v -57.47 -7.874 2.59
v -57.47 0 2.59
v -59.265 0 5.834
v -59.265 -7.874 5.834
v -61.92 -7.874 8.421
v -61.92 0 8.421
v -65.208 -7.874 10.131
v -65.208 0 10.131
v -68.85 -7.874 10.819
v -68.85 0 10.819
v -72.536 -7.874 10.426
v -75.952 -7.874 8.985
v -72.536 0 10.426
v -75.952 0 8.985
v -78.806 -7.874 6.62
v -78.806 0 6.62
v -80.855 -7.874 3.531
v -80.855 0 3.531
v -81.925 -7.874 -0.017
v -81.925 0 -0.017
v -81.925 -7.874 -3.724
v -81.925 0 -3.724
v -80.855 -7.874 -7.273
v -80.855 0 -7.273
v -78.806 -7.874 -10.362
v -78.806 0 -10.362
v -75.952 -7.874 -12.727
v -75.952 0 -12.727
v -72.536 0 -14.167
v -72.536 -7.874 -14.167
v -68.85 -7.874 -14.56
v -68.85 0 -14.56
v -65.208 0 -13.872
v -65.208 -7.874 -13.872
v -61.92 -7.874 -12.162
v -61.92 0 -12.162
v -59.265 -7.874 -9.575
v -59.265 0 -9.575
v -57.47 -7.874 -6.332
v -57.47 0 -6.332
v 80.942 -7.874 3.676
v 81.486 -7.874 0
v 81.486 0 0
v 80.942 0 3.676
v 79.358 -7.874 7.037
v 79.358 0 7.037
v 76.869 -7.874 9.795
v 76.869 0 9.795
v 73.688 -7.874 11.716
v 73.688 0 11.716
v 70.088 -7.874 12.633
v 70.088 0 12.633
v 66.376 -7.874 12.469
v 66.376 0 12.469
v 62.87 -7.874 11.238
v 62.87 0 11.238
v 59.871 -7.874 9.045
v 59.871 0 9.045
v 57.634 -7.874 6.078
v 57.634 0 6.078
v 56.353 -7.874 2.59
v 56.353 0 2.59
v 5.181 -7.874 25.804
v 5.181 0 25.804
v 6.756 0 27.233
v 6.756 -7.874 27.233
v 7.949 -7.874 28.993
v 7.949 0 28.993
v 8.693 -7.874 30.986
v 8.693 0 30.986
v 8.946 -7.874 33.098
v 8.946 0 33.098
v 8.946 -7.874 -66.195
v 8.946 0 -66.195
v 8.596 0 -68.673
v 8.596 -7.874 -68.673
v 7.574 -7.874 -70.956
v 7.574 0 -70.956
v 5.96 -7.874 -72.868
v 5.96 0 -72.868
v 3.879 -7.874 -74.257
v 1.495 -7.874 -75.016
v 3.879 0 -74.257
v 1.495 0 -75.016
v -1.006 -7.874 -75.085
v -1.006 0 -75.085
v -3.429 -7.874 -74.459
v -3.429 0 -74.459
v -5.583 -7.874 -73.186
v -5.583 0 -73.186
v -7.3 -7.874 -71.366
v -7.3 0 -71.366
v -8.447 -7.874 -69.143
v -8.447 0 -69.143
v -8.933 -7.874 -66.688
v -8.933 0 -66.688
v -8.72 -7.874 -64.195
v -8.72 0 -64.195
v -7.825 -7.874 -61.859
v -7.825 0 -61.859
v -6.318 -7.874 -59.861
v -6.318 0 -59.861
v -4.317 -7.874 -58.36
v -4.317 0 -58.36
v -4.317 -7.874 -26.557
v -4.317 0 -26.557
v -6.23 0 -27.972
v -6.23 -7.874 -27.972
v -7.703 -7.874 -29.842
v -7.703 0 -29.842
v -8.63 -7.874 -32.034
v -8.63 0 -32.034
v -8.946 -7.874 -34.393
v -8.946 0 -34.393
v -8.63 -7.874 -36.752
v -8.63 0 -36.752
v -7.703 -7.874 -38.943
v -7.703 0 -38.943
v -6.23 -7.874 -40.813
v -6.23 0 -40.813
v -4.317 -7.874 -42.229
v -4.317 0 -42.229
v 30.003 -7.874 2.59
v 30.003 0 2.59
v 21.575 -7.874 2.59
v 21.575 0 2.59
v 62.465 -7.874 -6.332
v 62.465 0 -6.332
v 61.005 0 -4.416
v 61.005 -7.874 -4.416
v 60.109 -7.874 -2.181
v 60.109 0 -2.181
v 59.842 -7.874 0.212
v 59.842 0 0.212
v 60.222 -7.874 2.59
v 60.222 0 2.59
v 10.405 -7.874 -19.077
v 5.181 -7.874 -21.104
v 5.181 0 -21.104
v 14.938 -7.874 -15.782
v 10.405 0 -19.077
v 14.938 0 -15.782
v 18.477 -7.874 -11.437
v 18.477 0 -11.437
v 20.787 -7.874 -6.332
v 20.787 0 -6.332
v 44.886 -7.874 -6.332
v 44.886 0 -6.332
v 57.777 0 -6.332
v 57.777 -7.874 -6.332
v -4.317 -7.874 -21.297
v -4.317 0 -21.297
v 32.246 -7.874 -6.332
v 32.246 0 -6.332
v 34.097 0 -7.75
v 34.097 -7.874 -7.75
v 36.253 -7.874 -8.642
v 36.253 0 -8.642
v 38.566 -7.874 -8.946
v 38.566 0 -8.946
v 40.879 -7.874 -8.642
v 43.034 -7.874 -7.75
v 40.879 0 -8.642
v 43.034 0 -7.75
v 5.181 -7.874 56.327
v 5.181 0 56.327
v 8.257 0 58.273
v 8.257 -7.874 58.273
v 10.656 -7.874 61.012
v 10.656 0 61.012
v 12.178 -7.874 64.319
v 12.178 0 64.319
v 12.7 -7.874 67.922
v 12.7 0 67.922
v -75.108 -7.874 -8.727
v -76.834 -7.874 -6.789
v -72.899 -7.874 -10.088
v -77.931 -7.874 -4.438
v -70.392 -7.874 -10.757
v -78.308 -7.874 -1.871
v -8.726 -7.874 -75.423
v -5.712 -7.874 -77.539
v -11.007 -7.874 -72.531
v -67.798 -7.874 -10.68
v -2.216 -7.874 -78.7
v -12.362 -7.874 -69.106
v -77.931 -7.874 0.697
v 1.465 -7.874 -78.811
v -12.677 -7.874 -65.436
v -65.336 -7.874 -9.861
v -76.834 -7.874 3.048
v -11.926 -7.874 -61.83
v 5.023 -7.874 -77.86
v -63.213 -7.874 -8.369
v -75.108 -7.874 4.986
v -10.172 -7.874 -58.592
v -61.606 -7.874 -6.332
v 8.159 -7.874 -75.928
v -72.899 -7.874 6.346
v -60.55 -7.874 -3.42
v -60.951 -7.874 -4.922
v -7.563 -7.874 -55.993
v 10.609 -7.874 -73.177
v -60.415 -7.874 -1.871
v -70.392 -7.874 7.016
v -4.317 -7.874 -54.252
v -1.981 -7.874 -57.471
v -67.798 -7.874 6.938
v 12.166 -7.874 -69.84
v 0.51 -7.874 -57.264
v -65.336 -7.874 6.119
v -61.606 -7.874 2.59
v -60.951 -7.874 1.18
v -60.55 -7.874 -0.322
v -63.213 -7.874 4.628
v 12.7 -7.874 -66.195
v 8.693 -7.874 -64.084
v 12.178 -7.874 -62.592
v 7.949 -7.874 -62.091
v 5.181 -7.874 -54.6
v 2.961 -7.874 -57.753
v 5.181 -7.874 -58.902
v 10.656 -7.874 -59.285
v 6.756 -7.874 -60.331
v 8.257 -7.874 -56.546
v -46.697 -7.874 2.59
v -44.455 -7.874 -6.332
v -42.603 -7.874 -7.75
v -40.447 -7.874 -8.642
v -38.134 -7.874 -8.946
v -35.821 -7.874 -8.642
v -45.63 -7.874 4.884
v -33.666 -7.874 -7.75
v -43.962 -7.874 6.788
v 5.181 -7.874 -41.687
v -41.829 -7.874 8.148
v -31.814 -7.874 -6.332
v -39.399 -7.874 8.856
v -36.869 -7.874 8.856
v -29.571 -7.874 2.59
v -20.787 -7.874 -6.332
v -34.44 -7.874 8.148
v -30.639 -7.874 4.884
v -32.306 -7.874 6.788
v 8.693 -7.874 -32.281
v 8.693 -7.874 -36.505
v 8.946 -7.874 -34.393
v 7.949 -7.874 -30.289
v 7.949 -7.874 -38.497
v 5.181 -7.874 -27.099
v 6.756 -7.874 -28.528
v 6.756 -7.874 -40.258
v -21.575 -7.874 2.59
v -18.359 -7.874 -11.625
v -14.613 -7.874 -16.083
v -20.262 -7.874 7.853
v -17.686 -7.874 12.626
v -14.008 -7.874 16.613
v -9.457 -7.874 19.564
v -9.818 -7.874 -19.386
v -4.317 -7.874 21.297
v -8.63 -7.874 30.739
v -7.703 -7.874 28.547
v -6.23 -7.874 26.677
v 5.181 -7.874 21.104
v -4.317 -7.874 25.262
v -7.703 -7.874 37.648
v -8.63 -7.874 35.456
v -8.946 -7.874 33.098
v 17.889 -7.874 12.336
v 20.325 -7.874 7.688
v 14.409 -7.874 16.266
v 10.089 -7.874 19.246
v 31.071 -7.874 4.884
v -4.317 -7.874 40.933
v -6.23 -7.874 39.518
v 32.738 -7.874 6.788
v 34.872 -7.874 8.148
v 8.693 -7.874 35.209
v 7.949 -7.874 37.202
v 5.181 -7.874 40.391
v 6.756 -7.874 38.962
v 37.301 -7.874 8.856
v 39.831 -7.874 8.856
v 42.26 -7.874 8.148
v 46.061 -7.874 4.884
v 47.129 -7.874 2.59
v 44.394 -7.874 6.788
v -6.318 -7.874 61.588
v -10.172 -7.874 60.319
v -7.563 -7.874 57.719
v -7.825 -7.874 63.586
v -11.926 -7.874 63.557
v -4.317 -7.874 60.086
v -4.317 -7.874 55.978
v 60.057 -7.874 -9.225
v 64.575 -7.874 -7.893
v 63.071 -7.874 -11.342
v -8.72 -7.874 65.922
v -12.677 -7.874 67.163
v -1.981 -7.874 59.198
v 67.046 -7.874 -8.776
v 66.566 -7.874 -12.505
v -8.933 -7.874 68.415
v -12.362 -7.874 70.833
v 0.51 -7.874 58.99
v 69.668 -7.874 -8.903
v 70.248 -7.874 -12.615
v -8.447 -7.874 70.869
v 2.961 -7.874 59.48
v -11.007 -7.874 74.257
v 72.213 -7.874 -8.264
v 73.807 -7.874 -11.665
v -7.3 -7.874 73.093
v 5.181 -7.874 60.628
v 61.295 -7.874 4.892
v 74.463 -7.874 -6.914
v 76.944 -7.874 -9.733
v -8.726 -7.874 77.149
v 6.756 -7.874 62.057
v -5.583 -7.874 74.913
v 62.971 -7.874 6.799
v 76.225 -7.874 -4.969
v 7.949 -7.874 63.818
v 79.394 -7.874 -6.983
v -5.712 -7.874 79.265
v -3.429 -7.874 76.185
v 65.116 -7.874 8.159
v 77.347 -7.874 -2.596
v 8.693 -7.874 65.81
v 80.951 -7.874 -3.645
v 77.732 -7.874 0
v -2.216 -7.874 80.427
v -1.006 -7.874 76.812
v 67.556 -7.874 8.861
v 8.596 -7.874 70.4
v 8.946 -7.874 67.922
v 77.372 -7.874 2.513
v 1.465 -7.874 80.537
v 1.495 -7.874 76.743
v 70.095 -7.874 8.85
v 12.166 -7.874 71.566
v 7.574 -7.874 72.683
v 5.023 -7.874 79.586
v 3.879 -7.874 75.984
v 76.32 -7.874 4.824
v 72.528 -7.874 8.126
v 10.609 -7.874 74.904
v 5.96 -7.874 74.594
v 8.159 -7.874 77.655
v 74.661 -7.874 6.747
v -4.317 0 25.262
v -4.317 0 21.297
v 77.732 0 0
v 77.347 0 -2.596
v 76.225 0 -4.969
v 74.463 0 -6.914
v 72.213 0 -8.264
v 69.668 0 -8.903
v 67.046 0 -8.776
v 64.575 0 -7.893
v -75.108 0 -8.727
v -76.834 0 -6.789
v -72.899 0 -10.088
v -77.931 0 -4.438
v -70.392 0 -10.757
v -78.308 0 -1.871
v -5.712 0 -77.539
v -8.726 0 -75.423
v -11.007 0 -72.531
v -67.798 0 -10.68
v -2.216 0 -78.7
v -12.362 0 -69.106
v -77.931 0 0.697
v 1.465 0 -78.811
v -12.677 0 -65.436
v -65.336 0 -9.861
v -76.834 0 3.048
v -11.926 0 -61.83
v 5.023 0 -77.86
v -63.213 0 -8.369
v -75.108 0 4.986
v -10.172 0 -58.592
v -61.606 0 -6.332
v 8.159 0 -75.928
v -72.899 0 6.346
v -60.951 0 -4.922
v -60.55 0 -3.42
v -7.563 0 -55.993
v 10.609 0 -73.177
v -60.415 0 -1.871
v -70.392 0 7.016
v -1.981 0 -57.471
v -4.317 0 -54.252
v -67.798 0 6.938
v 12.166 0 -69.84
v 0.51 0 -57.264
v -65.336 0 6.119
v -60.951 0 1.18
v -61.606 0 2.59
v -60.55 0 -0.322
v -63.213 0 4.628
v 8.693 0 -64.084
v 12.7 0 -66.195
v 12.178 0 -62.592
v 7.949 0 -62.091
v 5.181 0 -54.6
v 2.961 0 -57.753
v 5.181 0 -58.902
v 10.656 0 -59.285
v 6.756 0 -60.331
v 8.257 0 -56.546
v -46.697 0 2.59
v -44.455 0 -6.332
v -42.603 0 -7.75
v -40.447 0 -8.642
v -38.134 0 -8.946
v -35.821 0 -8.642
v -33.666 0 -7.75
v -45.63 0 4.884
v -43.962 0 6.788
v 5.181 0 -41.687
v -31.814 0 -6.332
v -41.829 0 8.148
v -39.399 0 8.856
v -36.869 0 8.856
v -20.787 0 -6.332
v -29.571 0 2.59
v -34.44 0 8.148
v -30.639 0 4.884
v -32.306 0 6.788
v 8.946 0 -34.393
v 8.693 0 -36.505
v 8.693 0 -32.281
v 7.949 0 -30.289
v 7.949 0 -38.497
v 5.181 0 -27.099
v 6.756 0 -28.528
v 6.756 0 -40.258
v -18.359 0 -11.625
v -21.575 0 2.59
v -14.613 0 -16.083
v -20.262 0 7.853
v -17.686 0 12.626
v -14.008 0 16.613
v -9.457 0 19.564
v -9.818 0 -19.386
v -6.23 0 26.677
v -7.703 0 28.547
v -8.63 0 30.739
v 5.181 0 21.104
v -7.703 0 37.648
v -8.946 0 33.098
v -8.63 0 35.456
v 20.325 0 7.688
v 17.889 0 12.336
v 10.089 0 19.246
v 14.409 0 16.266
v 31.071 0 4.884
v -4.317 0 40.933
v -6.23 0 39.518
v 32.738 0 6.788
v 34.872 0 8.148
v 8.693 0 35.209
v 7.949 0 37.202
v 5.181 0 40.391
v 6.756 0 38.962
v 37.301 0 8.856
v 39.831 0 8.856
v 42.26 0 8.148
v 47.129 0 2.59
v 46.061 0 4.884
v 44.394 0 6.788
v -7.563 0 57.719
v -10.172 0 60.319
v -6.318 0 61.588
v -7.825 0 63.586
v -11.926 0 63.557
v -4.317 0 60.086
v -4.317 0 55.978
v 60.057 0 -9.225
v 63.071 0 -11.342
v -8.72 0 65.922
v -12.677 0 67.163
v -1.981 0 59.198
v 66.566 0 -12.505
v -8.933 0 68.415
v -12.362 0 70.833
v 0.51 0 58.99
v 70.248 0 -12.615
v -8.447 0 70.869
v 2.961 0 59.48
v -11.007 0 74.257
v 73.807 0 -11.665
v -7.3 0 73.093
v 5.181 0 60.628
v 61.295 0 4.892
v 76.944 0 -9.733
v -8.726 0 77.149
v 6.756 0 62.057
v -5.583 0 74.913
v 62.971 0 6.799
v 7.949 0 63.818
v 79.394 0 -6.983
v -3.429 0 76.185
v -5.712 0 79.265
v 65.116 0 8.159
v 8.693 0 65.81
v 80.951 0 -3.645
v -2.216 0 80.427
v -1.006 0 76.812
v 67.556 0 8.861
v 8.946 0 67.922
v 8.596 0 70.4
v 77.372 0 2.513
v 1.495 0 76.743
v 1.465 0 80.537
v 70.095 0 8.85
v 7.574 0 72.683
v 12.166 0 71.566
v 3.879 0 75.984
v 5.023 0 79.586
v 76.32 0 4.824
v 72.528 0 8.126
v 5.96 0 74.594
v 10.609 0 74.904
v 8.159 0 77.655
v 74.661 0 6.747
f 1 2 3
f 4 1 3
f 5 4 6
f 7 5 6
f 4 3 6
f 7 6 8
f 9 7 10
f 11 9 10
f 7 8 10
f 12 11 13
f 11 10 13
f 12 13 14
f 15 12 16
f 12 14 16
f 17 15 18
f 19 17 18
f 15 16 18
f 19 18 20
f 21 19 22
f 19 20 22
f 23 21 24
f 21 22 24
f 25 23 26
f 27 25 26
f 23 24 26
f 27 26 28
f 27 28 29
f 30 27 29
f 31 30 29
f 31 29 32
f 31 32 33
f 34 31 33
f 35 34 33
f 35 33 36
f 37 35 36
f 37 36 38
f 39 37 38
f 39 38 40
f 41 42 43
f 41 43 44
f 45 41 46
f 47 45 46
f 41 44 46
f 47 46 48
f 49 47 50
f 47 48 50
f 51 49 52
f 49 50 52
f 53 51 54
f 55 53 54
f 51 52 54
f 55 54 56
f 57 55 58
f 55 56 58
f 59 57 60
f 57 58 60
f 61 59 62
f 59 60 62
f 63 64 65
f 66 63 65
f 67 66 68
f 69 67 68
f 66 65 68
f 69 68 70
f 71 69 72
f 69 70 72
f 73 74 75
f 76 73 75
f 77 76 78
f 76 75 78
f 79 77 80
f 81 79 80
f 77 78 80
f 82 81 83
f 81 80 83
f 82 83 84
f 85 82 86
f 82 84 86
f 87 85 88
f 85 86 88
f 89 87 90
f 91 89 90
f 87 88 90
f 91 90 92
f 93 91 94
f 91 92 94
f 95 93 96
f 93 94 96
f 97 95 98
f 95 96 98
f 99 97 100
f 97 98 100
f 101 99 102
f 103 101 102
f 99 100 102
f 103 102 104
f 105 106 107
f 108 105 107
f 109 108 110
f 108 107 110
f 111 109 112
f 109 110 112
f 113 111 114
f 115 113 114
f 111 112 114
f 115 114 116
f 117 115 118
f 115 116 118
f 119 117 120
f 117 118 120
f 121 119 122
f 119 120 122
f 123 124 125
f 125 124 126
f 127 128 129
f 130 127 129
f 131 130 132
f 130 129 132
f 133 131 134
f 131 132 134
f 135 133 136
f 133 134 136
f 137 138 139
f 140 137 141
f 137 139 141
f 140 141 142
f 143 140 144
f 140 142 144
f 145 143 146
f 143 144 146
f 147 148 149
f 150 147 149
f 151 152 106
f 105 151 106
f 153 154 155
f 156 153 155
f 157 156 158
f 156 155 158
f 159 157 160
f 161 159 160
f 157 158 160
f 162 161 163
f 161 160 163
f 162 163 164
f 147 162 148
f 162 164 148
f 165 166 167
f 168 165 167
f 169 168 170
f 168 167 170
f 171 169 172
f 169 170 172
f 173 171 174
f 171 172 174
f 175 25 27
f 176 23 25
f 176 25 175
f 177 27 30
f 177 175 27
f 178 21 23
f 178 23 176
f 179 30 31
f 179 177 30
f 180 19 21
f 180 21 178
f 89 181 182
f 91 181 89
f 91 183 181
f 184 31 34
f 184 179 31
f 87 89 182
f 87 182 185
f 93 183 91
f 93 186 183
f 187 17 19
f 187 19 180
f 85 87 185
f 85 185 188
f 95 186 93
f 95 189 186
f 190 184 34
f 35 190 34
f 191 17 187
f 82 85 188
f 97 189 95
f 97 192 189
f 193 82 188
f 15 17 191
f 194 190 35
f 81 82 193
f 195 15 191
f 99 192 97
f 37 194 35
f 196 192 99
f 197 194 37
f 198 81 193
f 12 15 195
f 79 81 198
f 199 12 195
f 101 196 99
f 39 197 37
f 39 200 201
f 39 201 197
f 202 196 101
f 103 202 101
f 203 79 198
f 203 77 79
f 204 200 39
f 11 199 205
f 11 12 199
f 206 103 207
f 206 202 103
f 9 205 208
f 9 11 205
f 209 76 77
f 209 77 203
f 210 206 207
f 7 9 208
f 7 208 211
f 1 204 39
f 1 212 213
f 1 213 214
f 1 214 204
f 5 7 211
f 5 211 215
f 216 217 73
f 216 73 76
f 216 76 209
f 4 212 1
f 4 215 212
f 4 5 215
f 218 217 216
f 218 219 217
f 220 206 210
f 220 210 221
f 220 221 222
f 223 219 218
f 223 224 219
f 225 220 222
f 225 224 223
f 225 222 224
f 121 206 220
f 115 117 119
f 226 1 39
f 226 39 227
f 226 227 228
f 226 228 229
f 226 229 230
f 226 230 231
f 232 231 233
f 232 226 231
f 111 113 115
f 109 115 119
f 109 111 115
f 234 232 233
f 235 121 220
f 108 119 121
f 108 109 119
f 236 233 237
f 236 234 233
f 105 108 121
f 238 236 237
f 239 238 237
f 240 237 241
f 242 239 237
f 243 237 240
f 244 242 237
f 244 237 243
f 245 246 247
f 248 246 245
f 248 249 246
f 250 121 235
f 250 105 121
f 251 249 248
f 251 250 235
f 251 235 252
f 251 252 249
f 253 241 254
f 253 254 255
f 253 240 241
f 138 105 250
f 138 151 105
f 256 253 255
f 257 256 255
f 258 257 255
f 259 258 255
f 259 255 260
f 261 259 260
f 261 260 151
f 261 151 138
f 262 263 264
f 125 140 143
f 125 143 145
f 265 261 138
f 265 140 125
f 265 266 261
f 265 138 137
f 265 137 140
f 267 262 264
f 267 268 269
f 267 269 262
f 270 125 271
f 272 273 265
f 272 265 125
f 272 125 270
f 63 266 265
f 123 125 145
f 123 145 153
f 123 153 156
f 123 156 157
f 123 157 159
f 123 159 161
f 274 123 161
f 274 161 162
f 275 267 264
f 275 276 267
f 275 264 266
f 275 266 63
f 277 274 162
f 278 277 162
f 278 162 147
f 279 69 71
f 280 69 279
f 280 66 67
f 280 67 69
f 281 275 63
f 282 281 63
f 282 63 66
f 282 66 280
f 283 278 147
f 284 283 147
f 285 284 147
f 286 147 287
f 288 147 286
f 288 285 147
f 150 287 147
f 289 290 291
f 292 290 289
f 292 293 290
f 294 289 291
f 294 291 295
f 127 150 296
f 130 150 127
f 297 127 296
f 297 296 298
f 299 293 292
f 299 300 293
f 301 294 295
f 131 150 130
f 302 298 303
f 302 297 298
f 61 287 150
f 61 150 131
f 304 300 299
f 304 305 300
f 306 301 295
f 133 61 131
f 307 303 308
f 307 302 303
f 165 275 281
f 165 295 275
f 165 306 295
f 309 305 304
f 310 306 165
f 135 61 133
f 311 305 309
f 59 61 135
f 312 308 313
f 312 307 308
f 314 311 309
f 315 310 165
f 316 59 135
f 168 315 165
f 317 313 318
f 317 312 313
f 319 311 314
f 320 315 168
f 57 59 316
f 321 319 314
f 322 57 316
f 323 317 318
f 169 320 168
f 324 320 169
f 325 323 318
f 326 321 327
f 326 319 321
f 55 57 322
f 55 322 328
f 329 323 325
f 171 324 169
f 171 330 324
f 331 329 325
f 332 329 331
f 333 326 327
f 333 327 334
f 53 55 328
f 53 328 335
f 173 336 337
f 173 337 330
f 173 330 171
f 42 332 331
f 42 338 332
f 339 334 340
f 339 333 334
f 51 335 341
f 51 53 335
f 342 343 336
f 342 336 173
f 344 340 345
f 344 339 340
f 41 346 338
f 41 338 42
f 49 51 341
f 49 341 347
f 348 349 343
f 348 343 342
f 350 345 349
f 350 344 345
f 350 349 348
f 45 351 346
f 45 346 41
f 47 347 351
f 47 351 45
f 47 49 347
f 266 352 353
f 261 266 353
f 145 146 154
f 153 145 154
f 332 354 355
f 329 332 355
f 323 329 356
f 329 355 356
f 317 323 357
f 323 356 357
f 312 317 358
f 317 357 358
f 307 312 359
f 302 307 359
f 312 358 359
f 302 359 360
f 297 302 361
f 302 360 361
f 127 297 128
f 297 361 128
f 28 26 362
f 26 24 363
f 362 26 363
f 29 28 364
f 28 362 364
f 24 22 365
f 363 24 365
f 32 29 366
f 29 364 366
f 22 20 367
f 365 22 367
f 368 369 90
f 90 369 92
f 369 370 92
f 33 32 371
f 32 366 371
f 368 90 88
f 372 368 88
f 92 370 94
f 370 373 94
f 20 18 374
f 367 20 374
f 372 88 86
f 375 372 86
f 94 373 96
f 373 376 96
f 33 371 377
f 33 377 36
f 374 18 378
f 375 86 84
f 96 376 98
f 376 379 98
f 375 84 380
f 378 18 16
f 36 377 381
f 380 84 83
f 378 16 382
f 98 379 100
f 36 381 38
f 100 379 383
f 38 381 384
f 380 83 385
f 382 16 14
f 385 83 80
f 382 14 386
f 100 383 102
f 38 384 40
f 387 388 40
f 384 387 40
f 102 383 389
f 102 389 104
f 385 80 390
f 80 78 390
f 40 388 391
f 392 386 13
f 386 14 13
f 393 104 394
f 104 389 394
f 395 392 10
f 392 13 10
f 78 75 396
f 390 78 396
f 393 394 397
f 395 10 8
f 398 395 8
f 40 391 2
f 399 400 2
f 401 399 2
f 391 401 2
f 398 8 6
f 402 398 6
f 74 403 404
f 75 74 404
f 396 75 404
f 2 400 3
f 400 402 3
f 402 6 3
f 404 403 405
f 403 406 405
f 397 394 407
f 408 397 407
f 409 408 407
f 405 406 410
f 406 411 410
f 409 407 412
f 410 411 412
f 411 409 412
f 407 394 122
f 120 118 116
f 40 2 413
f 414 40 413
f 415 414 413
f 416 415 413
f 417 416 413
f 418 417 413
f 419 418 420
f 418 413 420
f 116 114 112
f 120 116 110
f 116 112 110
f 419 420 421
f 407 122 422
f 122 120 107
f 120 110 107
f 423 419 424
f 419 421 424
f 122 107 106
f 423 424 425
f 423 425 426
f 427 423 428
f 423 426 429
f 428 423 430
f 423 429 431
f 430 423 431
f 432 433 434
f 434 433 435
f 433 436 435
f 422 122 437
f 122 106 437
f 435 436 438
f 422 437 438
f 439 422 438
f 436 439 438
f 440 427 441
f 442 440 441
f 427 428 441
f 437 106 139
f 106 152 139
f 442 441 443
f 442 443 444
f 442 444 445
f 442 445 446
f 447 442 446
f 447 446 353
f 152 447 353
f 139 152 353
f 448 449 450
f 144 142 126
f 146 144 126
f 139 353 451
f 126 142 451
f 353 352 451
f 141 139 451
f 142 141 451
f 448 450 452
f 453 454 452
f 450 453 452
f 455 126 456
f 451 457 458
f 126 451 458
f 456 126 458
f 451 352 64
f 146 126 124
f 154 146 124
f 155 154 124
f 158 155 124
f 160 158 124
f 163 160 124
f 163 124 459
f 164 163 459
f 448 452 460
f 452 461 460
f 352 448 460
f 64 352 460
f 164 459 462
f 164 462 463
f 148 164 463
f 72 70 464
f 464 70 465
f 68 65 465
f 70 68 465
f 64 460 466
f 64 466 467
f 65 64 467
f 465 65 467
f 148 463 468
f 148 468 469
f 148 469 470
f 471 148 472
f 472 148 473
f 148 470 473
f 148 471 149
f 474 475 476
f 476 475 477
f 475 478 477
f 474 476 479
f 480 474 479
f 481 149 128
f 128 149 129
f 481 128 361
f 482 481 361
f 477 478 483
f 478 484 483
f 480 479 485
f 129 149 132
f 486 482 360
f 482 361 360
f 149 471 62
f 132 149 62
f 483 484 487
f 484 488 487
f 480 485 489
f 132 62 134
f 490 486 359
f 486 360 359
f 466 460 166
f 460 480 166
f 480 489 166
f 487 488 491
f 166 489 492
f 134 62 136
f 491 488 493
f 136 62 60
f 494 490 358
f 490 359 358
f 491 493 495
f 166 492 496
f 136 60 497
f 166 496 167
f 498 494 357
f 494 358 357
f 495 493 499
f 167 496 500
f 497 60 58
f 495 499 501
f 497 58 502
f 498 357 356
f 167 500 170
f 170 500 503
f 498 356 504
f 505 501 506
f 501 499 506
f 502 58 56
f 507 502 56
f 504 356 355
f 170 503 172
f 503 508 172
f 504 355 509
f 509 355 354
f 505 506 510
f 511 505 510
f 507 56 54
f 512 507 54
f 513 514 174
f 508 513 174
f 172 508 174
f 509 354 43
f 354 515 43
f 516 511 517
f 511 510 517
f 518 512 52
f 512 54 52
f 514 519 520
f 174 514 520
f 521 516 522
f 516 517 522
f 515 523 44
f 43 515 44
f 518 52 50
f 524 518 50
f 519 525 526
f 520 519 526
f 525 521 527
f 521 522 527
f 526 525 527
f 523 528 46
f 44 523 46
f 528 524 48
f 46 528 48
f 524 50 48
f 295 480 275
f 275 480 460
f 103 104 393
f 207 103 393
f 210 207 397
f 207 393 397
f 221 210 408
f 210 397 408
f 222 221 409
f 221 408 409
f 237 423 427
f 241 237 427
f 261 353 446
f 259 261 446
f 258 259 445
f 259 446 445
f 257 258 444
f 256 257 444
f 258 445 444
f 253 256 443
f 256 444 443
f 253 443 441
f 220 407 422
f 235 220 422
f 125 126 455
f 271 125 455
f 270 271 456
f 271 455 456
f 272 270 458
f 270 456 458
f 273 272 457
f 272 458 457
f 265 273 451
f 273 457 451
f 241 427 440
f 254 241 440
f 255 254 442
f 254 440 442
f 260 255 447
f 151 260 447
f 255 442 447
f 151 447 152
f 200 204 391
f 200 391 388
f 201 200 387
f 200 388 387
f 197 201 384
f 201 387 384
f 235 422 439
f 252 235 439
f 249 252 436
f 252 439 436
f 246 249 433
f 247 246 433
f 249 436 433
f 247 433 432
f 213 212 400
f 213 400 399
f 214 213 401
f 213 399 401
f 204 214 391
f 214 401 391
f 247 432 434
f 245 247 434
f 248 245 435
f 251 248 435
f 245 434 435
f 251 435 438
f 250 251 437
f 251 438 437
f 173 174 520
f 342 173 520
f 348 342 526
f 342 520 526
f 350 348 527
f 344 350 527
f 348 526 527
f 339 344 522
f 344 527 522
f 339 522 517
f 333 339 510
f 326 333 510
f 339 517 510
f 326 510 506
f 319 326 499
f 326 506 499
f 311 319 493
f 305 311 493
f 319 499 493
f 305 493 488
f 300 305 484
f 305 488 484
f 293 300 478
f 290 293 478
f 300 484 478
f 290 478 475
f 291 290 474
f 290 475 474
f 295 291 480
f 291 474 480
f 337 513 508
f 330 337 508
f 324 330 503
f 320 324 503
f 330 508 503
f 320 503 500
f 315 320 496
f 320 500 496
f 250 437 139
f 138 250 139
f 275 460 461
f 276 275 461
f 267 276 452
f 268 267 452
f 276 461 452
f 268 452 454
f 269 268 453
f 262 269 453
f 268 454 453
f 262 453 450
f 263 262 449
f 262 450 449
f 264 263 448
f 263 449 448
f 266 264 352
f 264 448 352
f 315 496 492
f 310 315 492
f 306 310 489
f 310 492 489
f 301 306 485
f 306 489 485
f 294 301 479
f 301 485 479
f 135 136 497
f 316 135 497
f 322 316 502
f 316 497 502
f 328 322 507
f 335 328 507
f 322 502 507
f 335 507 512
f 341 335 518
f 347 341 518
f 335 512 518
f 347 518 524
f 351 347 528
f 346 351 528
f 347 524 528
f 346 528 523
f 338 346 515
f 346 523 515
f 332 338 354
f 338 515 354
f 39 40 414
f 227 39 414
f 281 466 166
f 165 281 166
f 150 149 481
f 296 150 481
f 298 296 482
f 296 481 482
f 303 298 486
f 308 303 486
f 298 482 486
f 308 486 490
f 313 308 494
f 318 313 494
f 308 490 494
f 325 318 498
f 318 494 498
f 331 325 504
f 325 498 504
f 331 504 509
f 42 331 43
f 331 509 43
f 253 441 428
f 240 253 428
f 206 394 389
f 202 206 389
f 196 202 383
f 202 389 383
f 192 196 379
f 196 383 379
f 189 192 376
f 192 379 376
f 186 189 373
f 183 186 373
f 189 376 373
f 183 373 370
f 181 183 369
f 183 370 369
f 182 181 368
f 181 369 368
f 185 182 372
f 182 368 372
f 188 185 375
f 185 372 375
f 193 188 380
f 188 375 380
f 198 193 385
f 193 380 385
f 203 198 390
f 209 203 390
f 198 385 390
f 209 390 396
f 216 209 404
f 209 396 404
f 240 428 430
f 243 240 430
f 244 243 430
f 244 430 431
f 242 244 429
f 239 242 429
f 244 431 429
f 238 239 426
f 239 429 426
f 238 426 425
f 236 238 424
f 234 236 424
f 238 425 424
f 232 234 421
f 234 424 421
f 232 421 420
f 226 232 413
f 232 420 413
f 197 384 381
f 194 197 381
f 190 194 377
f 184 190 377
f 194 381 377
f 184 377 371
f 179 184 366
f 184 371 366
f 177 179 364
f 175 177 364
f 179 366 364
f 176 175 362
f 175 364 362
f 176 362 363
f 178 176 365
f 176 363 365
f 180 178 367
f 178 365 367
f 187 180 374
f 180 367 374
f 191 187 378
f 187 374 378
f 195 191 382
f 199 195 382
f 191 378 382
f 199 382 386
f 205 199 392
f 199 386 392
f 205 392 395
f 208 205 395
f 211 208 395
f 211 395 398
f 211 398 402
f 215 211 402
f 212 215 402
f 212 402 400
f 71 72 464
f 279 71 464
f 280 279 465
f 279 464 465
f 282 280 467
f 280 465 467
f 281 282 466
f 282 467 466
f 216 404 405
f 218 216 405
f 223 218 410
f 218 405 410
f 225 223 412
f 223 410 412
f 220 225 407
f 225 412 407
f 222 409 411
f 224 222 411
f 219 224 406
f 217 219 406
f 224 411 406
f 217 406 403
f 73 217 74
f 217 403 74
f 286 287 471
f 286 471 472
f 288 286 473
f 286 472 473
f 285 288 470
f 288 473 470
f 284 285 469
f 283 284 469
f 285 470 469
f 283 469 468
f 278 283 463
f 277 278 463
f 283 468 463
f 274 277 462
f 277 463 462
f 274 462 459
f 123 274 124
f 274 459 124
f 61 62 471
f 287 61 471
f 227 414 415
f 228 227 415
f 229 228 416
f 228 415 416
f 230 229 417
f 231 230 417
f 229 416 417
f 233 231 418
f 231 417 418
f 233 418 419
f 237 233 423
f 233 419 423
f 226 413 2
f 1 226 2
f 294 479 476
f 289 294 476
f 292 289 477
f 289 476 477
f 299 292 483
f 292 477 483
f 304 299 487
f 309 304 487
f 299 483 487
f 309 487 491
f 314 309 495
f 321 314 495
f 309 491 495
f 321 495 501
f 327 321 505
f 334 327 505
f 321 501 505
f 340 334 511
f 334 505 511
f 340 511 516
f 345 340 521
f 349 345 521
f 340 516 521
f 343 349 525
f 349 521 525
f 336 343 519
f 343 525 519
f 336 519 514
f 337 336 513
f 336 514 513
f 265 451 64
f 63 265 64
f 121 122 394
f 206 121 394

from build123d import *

# Parameters (mm, degrees)
F1_DEPTH = 7.874


with BuildPart() as f1:
    # F0 (on Front) → F1 (new body)
    with BuildSketch(Plane.XZ):
        with BuildLine():
            Line((-4.3170880526, 2.5902516209), (-4.3170880526, 0))
            Line((-4.3170880526, 0), (5.18050557, 0))
            Line((5.18050557, 0), (5.18050557, 2.5902516209))
            Line((5.18050557, 2.5902516209), (5.18050557, 21.1036454269))
            ThreePointArc((5.18050557, 21.1036454269), (0.4424065531, 21.7256936531), (-4.3170880526, 21.2970476595))
            Line((-4.3170880526, 21.2970476595), (-4.3170880526, 2.5902516209))
        make_face()
        with BuildLine():
            Line((-4.3170880526, -6.3317269087), (-4.3170880526, 0))
            Line((-4.3170880526, 0), (-4.3170880526, 2.5902516209))
            Line((-4.3170880526, 2.5902516209), (-21.5752655791, 2.5902516209))
            ThreePointArc((-21.5752655791, 2.5902516209), (-21.6459371683, -1.911777281), (-20.7872730925, -6.3317269087))
            Line((-20.7872730925, -6.3317269087), (-4.3170880526, -6.3317269087))
        make_face()
        with BuildLine():
            Line((5.18050557, 0), (-4.3170880526, 0))
            Line((-4.3170880526, 0), (-4.3170880526, -6.3317269087))
            Line((-4.3170880526, -6.3317269087), (-4.3170880526, -21.2970476595))
            ThreePointArc((-4.3170880526, -21.2970476595), (0.4424065531, -21.7256936531), (5.18050557, -21.1036454269))
            Line((5.18050557, -21.1036454269), (5.18050557, -6.3317269087))
            Line((5.18050557, -6.3317269087), (5.18050557, 0))
        make_face()
        with BuildLine():
            Line((5.18050557, 2.5902516209), (5.18050557, 0))
            Line((5.18050557, 0), (5.18050557, -6.3317269087))
            Line((5.18050557, -6.3317269087), (20.7872730925, -6.3317269087))
            ThreePointArc((20.7872730925, -6.3317269087), (21.4931738046, -3.2007761674), (21.7301976122, 0))
            ThreePointArc((21.7301976122, 0), (21.6914300224, 1.297440499), (21.5752655791, 2.5902516209))
            Line((21.5752655791, 2.5902516209), (5.18050557, 2.5902516209))
        make_face()
        with BuildLine():
            Line((-21.5752655791, 2.5902516209), (-4.3170880526, 2.5902516209))
            Line((-4.3170880526, 2.5902516209), (-4.3170880526, 21.2970476595))
            ThreePointArc((-4.3170880526, 21.2970476595), (-15.9715230537, 14.7347188508), (-21.5752655791, 2.5902516209))
        make_face()
        with BuildLine():
            Line((-4.3170880526, -21.2970476595), (-4.3170880526, -6.3317269087))
            Line((-4.3170880526, -6.3317269087), (-20.7872730925, -6.3317269087))
            ThreePointArc((-20.7872730925, -6.3317269087), (-14.6132625864, -16.0827250442), (-4.3170880526, -21.2970476595))
        make_face()
        with BuildLine():
            Line((5.18050557, 21.1036454269), (5.18050557, 2.5902516209))
            Line((5.18050557, 2.5902516209), (21.5752655791, 2.5902516209))
            ThreePointArc((21.5752655791, 2.5902516209), (16.2681978105, 14.4064995147), (5.18050557, 21.1036454269))
        make_face()
        with BuildLine():
            Line((20.7872730925, -6.3317269087), (5.18050557, -6.3317269087))
            Line((5.18050557, -6.3317269087), (5.18050557, -21.1036454269))
            ThreePointArc((5.18050557, -21.1036454269), (14.9376630148, -15.7818792266), (20.7872730925, -6.3317269087))
        make_face()
        with BuildLine():
            Line((-4.3170880526, 25.2618949621), (-4.3170880526, 21.2970476595))
            ThreePointArc((-4.3170880526, 21.2970476595), (0.4424065531, 21.7256936531), (5.18050557, 21.1036454269))
            Line((5.18050557, 21.1036454269), (5.18050557, 25.8039073839))
            ThreePointArc((5.18050557, 25.8039073839), (0.5097222957, 24.1658829253), (-4.3170880526, 25.2618949621))
        make_face()
        with BuildLine():
            ThreePointArc((-20.7872730925, -6.3317269087), (-21.6459371683, -1.911777281), (-21.5752655791, 2.5902516209))
            Line((-21.5752655791, 2.5902516209), (-29.5711408342, 2.5902516209))
            ThreePointArc((-29.5711408342, 2.5902516209), (-29.2842683913, 1.3092207994), (-29.1879529597, 0))
            ThreePointArc((-29.1879529597, 0), (-29.870502249, -3.4273494116), (-31.814001381, -6.3317269087))
            Line((-31.814001381, -6.3317269087), (-20.7872730925, -6.3317269087))
        make_face()
        with BuildLine():
            ThreePointArc((5.18050557, -21.1036454269), (0.4424065531, -21.7256936531), (-4.3170880526, -21.2970476595))
            Line((-4.3170880526, -21.2970476595), (-4.3170880526, -26.5570219367))
            ThreePointArc((-4.3170880526, -26.5570219367), (0.5097222957, -25.4610098999), (5.18050557, -27.0990343585))
            Line((5.18050557, -27.0990343585), (5.18050557, -21.1036454269))
        make_face()
        with BuildLine():
            Line((30.0028470318, 2.5902516209), (21.5752655791, 2.5902516209))
            ThreePointArc((21.5752655791, 2.5902516209), (21.6914300224, 1.297440499), (21.7301976122, 0))
            ThreePointArc((21.7301976122, 0), (21.4931738046, -3.2007761674), (20.7872730925, -6.3317269087))
            Line((20.7872730925, -6.3317269087), (32.2457075785, -6.3317269087))
            ThreePointArc((32.2457075785, -6.3317269087), (29.8896105664, -2.1811155839), (30.0028470318, 2.5902516209))
        make_face()
        with BuildLine():
            ThreePointArc((-4.3170880526, 40.9334291012), (-8.9463118, 33.0976620317), (-4.3170880526, 25.2618949621))
            Line((-4.3170880526, 25.2618949621), (-4.3170880526, 40.9334291012))
        make_face()
        with BuildLine():
            Line((-4.3170880526, 40.9334291012), (-4.3170880526, 25.2618949621))
            ThreePointArc((-4.3170880526, 25.2618949621), (0.5097222957, 24.1658829253), (5.18050557, 25.8039073839))
            Line((5.18050557, 25.8039073839), (5.18050557, 40.3914166794))
            ThreePointArc((5.18050557, 40.3914166794), (0.5097222957, 42.029441138), (-4.3170880526, 40.9334291012))
        make_face()
        with BuildLine():
            ThreePointArc((-29.1879529597, 0), (-29.2842683913, 1.3092207994), (-29.5711408342, 2.5902516209))
            Line((-29.5711408342, 2.5902516209), (-46.6973886852, 2.5902516209))
            ThreePointArc((-46.6973886852, 2.5902516209), (-46.8106251506, -2.1811155839), (-44.4545281385, -6.3317269087))
            Line((-44.4545281385, -6.3317269087), (-31.814001381, -6.3317269087))
            ThreePointArc((-31.814001381, -6.3317269087), (-29.870502249, -3.4273494116), (-29.1879529597, 0))
        make_face()
        with BuildLine():
            Line((-46.6973886852, 2.5902516209), (-29.5711408342, 2.5902516209))
            ThreePointArc((-29.5711408342, 2.5902516209), (-38.1342647597, 8.9463118), (-46.6973886852, 2.5902516209))
        make_face()
        with BuildLine():
            ThreePointArc((5.18050557, -27.0990343585), (0.5097222957, -25.4610098999), (-4.3170880526, -26.5570219367))
            Line((-4.3170880526, -26.5570219367), (-4.3170880526, -42.2285560758))
            ThreePointArc((-4.3170880526, -42.2285560758), (0.5097222957, -43.3245681126), (5.18050557, -41.686543654))
            Line((5.18050557, -41.686543654), (5.18050557, -27.0990343585))
        make_face()
        with BuildLine():
            Line((-4.3170880526, -42.2285560758), (-4.3170880526, -26.5570219367))
            ThreePointArc((-4.3170880526, -26.5570219367), (-8.9463118, -34.3927890062), (-4.3170880526, -42.2285560758))
        make_face()
        with BuildLine():
            ThreePointArc((-44.4545281385, -6.3317269087), (-38.1342647597, -8.9463118), (-31.814001381, -6.3317269087))
            Line((-31.814001381, -6.3317269087), (-44.4545281385, -6.3317269087))
        make_face()
        with BuildLine():
            Line((5.18050557, 40.3914166794), (5.18050557, 25.8039073839))
            ThreePointArc((5.18050557, 25.8039073839), (7.9493054078, 28.9933912857), (8.9463118, 33.0976620317))
            ThreePointArc((8.9463118, 33.0976620317), (7.9493054078, 37.2019327776), (5.18050557, 40.3914166794))
        make_face()
        with BuildLine():
            ThreePointArc((47.1290948828, 2.5902516209), (38.5659709573, 8.9463118), (30.0028470318, 2.5902516209))
            Line((30.0028470318, 2.5902516209), (47.1290948828, 2.5902516209))
        make_face()
        with BuildLine():
            Line((47.1290948828, 2.5902516209), (30.0028470318, 2.5902516209))
            ThreePointArc((30.0028470318, 2.5902516209), (29.8896105664, -2.1811155839), (32.2457075785, -6.3317269087))
            Line((32.2457075785, -6.3317269087), (44.886234336, -6.3317269087))
            ThreePointArc((44.886234336, -6.3317269087), (46.829733468, -3.4273494116), (47.5122827573, 0))
            ThreePointArc((47.5122827573, 0), (47.4159673257, 1.3092207994), (47.1290948828, 2.5902516209))
        make_face()
        with BuildLine():
            ThreePointArc((8.9463118, -34.3927890062), (7.9493054078, -30.2885182603), (5.18050557, -27.0990343585))
            Line((5.18050557, -27.0990343585), (5.18050557, -41.686543654))
            ThreePointArc((5.18050557, -41.686543654), (7.9493054078, -38.4970597522), (8.9463118, -34.3927890062))
        make_face()
        with BuildLine():
            Line((44.886234336, -6.3317269087), (32.2457075785, -6.3317269087))
            ThreePointArc((32.2457075785, -6.3317269087), (38.5659709573, -8.9463118), (44.886234336, -6.3317269087))
        make_face()
        with BuildLine():
            Line((-4.3170880526, 55.9784273321), (-4.3170880526, 40.9334291012))
            ThreePointArc((-4.3170880526, 40.9334291012), (0.5097222957, 42.029441138), (5.18050557, 40.3914166794))
            Line((5.18050557, 40.3914166794), (5.18050557, 56.3268005249))
            ThreePointArc((5.18050557, 56.3268005249), (0.4655248895, 55.2306949218), (-4.3170880526, 55.9784273321))
        make_face()
        with BuildLine():
            ThreePointArc((-44.4545281385, -6.3317269087), (-46.8106251506, -2.1811155839), (-46.6973886852, 2.5902516209))
            Line((-46.6973886852, 2.5902516209), (-57.4704526884, 2.5902516209))
            ThreePointArc((-57.4704526884, 2.5902516209), (-56.8651414964, 0.3961619644), (-56.6611875176, -1.8707376439))
            ThreePointArc((-56.6611875176, -1.8707376439), (-56.8651414964, -4.1376372522), (-57.4704526884, -6.3317269087))
            Line((-57.4704526884, -6.3317269087), (-44.4545281385, -6.3317269087))
        make_face()
        with BuildLine():
            ThreePointArc((5.18050557, -41.686543654), (0.5097222957, -43.3245681126), (-4.3170880526, -42.2285560758))
            Line((-4.3170880526, -42.2285560758), (-4.3170880526, -54.2515913659))
            ThreePointArc((-4.3170880526, -54.2515913659), (0.4655248895, -53.5038589557), (5.18050557, -54.5999645588))
            Line((5.18050557, -54.5999645588), (5.18050557, -41.686543654))
        make_face()
        with BuildLine():
            Line((56.3525334722, 2.5902516209), (47.1290948828, 2.5902516209))
            ThreePointArc((47.1290948828, 2.5902516209), (47.4159673257, 1.3092207994), (47.5122827573, 0))
            ThreePointArc((47.5122827573, 0), (46.829733468, -3.4273494116), (44.886234336, -6.3317269087))
            Line((44.886234336, -6.3317269087), (57.7765256303, -6.3317269087))
            ThreePointArc((57.7765256303, -6.3317269087), (56.2443100442, -2.0016487576), (56.3525334722, 2.5902516209))
        make_face()
        with BuildLine():
            ThreePointArc((12.7, 67.9221600294), (-7.2959914245, 78.3172795157), (-4.3170880526, 55.9784273321))
            Line((-4.3170880526, 55.9784273321), (-4.3170880526, 60.0863929598))
            ThreePointArc((-4.3170880526, 60.0863929598), (-4.5505207963, 75.6247086534), (8.9463118, 67.9221600294))
            ThreePointArc((8.9463118, 67.9221600294), (7.9493054078, 63.8178892835), (5.18050557, 60.6284053816))
            Line((5.18050557, 60.6284053816), (5.18050557, 56.3268005249))
            ThreePointArc((5.18050557, 56.3268005249), (10.6555717993, 61.0121101287), (12.7, 67.9221600294))
        make_face()
        with BuildLine():
            Line((-4.3170880526, 60.0863929598), (-4.3170880526, 55.9784273321))
            ThreePointArc((-4.3170880526, 55.9784273321), (0.4655248895, 55.2306949218), (5.18050557, 56.3268005249))
            Line((5.18050557, 56.3268005249), (5.18050557, 60.6284053816))
            ThreePointArc((5.18050557, 60.6284053816), (0.5097222957, 58.9903809231), (-4.3170880526, 60.0863929598))
        make_face()
        with BuildLine():
            ThreePointArc((-56.6611875176, -1.8707376439), (-56.8651414964, 0.3961619644), (-57.4704526884, 2.5902516209))
            Line((-57.4704526884, 2.5902516209), (-61.6064359556, 2.5902516209))
            ThreePointArc((-61.6064359556, 2.5902516209), (-60.7178933915, 0.4379554188), (-60.4148700066, -1.8707376439))
            ThreePointArc((-60.4148700066, -1.8707376439), (-60.7178933915, -4.1794307066), (-61.6064359556, -6.3317269087))
            Line((-61.6064359556, -6.3317269087), (-57.4704526884, -6.3317269087))
            ThreePointArc((-57.4704526884, -6.3317269087), (-56.8651414964, -4.1376372522), (-56.6611875176, -1.8707376439))
        make_face()
        with BuildLine():
            Line((-61.6064359556, 2.5902516209), (-57.4704526884, 2.5902516209))
            ThreePointArc((-57.4704526884, 2.5902516209), (-82.0611875176, -1.8707376439), (-57.4704526884, -6.3317269087))
            Line((-57.4704526884, -6.3317269087), (-61.6064359556, -6.3317269087))
            ThreePointArc((-61.6064359556, -6.3317269087), (-78.3075050287, -1.8707376439), (-61.6064359556, 2.5902516209))
        make_face()
        with BuildLine():
            ThreePointArc((5.18050557, -54.5999645588), (0.4655248895, -53.5038589557), (-4.3170880526, -54.2515913659))
            Line((-4.3170880526, -54.2515913659), (-4.3170880526, -58.3595569937))
            ThreePointArc((-4.3170880526, -58.3595569937), (0.5097222957, -57.263544957), (5.18050557, -58.9015694155))
            Line((5.18050557, -58.9015694155), (5.18050557, -54.5999645588))
        make_face()
        with BuildLine():
            Line((-4.3170880526, -58.3595569937), (-4.3170880526, -54.2515913659))
            ThreePointArc((-4.3170880526, -54.2515913659), (-7.2959914245, -76.5904435496), (12.7, -66.1953240633))
            ThreePointArc((12.7, -66.1953240633), (10.6555717993, -59.2852741626), (5.18050557, -54.5999645588))
            Line((5.18050557, -54.5999645588), (5.18050557, -58.9015694155))
            ThreePointArc((5.18050557, -58.9015694155), (7.9493054078, -62.0910533174), (8.9463118, -66.1953240633))
            ThreePointArc((8.9463118, -66.1953240633), (-4.5505207963, -73.8978726873), (-4.3170880526, -58.3595569937))
        make_face()
        with BuildLine():
            ThreePointArc((81.4855780125, 0), (70.0875638685, 12.6330848501), (56.3525334722, 2.5902516209))
            Line((56.3525334722, 2.5902516209), (60.222454087, 2.5902516209))
            ThreePointArc((60.222454087, 2.5902516209), (70.0947988119, 8.8499963684), (77.7318898125, 0))
            ThreePointArc((77.7318898125, 0), (72.2129274241, -8.2637625107), (62.4653146337, -6.3317269087))
            Line((62.4653146337, -6.3317269087), (57.7765256303, -6.3317269087))
            ThreePointArc((57.7765256303, -6.3317269087), (72.0623931389, -12.2699829921), (81.4855780125, 0))
        make_face()
        with BuildLine():
            Line((60.222454087, 2.5902516209), (56.3525334722, 2.5902516209))
            ThreePointArc((56.3525334722, 2.5902516209), (56.2443100442, -2.0016487576), (57.7765256303, -6.3317269087))
            Line((57.7765256303, -6.3317269087), (62.4653146337, -6.3317269087))
            ThreePointArc((62.4653146337, -6.3317269087), (60.1092176216, -2.1811155839), (60.222454087, 2.5902516209))
        make_face()
    extrude(amount=F1_DEPTH)


solid = f1.part
